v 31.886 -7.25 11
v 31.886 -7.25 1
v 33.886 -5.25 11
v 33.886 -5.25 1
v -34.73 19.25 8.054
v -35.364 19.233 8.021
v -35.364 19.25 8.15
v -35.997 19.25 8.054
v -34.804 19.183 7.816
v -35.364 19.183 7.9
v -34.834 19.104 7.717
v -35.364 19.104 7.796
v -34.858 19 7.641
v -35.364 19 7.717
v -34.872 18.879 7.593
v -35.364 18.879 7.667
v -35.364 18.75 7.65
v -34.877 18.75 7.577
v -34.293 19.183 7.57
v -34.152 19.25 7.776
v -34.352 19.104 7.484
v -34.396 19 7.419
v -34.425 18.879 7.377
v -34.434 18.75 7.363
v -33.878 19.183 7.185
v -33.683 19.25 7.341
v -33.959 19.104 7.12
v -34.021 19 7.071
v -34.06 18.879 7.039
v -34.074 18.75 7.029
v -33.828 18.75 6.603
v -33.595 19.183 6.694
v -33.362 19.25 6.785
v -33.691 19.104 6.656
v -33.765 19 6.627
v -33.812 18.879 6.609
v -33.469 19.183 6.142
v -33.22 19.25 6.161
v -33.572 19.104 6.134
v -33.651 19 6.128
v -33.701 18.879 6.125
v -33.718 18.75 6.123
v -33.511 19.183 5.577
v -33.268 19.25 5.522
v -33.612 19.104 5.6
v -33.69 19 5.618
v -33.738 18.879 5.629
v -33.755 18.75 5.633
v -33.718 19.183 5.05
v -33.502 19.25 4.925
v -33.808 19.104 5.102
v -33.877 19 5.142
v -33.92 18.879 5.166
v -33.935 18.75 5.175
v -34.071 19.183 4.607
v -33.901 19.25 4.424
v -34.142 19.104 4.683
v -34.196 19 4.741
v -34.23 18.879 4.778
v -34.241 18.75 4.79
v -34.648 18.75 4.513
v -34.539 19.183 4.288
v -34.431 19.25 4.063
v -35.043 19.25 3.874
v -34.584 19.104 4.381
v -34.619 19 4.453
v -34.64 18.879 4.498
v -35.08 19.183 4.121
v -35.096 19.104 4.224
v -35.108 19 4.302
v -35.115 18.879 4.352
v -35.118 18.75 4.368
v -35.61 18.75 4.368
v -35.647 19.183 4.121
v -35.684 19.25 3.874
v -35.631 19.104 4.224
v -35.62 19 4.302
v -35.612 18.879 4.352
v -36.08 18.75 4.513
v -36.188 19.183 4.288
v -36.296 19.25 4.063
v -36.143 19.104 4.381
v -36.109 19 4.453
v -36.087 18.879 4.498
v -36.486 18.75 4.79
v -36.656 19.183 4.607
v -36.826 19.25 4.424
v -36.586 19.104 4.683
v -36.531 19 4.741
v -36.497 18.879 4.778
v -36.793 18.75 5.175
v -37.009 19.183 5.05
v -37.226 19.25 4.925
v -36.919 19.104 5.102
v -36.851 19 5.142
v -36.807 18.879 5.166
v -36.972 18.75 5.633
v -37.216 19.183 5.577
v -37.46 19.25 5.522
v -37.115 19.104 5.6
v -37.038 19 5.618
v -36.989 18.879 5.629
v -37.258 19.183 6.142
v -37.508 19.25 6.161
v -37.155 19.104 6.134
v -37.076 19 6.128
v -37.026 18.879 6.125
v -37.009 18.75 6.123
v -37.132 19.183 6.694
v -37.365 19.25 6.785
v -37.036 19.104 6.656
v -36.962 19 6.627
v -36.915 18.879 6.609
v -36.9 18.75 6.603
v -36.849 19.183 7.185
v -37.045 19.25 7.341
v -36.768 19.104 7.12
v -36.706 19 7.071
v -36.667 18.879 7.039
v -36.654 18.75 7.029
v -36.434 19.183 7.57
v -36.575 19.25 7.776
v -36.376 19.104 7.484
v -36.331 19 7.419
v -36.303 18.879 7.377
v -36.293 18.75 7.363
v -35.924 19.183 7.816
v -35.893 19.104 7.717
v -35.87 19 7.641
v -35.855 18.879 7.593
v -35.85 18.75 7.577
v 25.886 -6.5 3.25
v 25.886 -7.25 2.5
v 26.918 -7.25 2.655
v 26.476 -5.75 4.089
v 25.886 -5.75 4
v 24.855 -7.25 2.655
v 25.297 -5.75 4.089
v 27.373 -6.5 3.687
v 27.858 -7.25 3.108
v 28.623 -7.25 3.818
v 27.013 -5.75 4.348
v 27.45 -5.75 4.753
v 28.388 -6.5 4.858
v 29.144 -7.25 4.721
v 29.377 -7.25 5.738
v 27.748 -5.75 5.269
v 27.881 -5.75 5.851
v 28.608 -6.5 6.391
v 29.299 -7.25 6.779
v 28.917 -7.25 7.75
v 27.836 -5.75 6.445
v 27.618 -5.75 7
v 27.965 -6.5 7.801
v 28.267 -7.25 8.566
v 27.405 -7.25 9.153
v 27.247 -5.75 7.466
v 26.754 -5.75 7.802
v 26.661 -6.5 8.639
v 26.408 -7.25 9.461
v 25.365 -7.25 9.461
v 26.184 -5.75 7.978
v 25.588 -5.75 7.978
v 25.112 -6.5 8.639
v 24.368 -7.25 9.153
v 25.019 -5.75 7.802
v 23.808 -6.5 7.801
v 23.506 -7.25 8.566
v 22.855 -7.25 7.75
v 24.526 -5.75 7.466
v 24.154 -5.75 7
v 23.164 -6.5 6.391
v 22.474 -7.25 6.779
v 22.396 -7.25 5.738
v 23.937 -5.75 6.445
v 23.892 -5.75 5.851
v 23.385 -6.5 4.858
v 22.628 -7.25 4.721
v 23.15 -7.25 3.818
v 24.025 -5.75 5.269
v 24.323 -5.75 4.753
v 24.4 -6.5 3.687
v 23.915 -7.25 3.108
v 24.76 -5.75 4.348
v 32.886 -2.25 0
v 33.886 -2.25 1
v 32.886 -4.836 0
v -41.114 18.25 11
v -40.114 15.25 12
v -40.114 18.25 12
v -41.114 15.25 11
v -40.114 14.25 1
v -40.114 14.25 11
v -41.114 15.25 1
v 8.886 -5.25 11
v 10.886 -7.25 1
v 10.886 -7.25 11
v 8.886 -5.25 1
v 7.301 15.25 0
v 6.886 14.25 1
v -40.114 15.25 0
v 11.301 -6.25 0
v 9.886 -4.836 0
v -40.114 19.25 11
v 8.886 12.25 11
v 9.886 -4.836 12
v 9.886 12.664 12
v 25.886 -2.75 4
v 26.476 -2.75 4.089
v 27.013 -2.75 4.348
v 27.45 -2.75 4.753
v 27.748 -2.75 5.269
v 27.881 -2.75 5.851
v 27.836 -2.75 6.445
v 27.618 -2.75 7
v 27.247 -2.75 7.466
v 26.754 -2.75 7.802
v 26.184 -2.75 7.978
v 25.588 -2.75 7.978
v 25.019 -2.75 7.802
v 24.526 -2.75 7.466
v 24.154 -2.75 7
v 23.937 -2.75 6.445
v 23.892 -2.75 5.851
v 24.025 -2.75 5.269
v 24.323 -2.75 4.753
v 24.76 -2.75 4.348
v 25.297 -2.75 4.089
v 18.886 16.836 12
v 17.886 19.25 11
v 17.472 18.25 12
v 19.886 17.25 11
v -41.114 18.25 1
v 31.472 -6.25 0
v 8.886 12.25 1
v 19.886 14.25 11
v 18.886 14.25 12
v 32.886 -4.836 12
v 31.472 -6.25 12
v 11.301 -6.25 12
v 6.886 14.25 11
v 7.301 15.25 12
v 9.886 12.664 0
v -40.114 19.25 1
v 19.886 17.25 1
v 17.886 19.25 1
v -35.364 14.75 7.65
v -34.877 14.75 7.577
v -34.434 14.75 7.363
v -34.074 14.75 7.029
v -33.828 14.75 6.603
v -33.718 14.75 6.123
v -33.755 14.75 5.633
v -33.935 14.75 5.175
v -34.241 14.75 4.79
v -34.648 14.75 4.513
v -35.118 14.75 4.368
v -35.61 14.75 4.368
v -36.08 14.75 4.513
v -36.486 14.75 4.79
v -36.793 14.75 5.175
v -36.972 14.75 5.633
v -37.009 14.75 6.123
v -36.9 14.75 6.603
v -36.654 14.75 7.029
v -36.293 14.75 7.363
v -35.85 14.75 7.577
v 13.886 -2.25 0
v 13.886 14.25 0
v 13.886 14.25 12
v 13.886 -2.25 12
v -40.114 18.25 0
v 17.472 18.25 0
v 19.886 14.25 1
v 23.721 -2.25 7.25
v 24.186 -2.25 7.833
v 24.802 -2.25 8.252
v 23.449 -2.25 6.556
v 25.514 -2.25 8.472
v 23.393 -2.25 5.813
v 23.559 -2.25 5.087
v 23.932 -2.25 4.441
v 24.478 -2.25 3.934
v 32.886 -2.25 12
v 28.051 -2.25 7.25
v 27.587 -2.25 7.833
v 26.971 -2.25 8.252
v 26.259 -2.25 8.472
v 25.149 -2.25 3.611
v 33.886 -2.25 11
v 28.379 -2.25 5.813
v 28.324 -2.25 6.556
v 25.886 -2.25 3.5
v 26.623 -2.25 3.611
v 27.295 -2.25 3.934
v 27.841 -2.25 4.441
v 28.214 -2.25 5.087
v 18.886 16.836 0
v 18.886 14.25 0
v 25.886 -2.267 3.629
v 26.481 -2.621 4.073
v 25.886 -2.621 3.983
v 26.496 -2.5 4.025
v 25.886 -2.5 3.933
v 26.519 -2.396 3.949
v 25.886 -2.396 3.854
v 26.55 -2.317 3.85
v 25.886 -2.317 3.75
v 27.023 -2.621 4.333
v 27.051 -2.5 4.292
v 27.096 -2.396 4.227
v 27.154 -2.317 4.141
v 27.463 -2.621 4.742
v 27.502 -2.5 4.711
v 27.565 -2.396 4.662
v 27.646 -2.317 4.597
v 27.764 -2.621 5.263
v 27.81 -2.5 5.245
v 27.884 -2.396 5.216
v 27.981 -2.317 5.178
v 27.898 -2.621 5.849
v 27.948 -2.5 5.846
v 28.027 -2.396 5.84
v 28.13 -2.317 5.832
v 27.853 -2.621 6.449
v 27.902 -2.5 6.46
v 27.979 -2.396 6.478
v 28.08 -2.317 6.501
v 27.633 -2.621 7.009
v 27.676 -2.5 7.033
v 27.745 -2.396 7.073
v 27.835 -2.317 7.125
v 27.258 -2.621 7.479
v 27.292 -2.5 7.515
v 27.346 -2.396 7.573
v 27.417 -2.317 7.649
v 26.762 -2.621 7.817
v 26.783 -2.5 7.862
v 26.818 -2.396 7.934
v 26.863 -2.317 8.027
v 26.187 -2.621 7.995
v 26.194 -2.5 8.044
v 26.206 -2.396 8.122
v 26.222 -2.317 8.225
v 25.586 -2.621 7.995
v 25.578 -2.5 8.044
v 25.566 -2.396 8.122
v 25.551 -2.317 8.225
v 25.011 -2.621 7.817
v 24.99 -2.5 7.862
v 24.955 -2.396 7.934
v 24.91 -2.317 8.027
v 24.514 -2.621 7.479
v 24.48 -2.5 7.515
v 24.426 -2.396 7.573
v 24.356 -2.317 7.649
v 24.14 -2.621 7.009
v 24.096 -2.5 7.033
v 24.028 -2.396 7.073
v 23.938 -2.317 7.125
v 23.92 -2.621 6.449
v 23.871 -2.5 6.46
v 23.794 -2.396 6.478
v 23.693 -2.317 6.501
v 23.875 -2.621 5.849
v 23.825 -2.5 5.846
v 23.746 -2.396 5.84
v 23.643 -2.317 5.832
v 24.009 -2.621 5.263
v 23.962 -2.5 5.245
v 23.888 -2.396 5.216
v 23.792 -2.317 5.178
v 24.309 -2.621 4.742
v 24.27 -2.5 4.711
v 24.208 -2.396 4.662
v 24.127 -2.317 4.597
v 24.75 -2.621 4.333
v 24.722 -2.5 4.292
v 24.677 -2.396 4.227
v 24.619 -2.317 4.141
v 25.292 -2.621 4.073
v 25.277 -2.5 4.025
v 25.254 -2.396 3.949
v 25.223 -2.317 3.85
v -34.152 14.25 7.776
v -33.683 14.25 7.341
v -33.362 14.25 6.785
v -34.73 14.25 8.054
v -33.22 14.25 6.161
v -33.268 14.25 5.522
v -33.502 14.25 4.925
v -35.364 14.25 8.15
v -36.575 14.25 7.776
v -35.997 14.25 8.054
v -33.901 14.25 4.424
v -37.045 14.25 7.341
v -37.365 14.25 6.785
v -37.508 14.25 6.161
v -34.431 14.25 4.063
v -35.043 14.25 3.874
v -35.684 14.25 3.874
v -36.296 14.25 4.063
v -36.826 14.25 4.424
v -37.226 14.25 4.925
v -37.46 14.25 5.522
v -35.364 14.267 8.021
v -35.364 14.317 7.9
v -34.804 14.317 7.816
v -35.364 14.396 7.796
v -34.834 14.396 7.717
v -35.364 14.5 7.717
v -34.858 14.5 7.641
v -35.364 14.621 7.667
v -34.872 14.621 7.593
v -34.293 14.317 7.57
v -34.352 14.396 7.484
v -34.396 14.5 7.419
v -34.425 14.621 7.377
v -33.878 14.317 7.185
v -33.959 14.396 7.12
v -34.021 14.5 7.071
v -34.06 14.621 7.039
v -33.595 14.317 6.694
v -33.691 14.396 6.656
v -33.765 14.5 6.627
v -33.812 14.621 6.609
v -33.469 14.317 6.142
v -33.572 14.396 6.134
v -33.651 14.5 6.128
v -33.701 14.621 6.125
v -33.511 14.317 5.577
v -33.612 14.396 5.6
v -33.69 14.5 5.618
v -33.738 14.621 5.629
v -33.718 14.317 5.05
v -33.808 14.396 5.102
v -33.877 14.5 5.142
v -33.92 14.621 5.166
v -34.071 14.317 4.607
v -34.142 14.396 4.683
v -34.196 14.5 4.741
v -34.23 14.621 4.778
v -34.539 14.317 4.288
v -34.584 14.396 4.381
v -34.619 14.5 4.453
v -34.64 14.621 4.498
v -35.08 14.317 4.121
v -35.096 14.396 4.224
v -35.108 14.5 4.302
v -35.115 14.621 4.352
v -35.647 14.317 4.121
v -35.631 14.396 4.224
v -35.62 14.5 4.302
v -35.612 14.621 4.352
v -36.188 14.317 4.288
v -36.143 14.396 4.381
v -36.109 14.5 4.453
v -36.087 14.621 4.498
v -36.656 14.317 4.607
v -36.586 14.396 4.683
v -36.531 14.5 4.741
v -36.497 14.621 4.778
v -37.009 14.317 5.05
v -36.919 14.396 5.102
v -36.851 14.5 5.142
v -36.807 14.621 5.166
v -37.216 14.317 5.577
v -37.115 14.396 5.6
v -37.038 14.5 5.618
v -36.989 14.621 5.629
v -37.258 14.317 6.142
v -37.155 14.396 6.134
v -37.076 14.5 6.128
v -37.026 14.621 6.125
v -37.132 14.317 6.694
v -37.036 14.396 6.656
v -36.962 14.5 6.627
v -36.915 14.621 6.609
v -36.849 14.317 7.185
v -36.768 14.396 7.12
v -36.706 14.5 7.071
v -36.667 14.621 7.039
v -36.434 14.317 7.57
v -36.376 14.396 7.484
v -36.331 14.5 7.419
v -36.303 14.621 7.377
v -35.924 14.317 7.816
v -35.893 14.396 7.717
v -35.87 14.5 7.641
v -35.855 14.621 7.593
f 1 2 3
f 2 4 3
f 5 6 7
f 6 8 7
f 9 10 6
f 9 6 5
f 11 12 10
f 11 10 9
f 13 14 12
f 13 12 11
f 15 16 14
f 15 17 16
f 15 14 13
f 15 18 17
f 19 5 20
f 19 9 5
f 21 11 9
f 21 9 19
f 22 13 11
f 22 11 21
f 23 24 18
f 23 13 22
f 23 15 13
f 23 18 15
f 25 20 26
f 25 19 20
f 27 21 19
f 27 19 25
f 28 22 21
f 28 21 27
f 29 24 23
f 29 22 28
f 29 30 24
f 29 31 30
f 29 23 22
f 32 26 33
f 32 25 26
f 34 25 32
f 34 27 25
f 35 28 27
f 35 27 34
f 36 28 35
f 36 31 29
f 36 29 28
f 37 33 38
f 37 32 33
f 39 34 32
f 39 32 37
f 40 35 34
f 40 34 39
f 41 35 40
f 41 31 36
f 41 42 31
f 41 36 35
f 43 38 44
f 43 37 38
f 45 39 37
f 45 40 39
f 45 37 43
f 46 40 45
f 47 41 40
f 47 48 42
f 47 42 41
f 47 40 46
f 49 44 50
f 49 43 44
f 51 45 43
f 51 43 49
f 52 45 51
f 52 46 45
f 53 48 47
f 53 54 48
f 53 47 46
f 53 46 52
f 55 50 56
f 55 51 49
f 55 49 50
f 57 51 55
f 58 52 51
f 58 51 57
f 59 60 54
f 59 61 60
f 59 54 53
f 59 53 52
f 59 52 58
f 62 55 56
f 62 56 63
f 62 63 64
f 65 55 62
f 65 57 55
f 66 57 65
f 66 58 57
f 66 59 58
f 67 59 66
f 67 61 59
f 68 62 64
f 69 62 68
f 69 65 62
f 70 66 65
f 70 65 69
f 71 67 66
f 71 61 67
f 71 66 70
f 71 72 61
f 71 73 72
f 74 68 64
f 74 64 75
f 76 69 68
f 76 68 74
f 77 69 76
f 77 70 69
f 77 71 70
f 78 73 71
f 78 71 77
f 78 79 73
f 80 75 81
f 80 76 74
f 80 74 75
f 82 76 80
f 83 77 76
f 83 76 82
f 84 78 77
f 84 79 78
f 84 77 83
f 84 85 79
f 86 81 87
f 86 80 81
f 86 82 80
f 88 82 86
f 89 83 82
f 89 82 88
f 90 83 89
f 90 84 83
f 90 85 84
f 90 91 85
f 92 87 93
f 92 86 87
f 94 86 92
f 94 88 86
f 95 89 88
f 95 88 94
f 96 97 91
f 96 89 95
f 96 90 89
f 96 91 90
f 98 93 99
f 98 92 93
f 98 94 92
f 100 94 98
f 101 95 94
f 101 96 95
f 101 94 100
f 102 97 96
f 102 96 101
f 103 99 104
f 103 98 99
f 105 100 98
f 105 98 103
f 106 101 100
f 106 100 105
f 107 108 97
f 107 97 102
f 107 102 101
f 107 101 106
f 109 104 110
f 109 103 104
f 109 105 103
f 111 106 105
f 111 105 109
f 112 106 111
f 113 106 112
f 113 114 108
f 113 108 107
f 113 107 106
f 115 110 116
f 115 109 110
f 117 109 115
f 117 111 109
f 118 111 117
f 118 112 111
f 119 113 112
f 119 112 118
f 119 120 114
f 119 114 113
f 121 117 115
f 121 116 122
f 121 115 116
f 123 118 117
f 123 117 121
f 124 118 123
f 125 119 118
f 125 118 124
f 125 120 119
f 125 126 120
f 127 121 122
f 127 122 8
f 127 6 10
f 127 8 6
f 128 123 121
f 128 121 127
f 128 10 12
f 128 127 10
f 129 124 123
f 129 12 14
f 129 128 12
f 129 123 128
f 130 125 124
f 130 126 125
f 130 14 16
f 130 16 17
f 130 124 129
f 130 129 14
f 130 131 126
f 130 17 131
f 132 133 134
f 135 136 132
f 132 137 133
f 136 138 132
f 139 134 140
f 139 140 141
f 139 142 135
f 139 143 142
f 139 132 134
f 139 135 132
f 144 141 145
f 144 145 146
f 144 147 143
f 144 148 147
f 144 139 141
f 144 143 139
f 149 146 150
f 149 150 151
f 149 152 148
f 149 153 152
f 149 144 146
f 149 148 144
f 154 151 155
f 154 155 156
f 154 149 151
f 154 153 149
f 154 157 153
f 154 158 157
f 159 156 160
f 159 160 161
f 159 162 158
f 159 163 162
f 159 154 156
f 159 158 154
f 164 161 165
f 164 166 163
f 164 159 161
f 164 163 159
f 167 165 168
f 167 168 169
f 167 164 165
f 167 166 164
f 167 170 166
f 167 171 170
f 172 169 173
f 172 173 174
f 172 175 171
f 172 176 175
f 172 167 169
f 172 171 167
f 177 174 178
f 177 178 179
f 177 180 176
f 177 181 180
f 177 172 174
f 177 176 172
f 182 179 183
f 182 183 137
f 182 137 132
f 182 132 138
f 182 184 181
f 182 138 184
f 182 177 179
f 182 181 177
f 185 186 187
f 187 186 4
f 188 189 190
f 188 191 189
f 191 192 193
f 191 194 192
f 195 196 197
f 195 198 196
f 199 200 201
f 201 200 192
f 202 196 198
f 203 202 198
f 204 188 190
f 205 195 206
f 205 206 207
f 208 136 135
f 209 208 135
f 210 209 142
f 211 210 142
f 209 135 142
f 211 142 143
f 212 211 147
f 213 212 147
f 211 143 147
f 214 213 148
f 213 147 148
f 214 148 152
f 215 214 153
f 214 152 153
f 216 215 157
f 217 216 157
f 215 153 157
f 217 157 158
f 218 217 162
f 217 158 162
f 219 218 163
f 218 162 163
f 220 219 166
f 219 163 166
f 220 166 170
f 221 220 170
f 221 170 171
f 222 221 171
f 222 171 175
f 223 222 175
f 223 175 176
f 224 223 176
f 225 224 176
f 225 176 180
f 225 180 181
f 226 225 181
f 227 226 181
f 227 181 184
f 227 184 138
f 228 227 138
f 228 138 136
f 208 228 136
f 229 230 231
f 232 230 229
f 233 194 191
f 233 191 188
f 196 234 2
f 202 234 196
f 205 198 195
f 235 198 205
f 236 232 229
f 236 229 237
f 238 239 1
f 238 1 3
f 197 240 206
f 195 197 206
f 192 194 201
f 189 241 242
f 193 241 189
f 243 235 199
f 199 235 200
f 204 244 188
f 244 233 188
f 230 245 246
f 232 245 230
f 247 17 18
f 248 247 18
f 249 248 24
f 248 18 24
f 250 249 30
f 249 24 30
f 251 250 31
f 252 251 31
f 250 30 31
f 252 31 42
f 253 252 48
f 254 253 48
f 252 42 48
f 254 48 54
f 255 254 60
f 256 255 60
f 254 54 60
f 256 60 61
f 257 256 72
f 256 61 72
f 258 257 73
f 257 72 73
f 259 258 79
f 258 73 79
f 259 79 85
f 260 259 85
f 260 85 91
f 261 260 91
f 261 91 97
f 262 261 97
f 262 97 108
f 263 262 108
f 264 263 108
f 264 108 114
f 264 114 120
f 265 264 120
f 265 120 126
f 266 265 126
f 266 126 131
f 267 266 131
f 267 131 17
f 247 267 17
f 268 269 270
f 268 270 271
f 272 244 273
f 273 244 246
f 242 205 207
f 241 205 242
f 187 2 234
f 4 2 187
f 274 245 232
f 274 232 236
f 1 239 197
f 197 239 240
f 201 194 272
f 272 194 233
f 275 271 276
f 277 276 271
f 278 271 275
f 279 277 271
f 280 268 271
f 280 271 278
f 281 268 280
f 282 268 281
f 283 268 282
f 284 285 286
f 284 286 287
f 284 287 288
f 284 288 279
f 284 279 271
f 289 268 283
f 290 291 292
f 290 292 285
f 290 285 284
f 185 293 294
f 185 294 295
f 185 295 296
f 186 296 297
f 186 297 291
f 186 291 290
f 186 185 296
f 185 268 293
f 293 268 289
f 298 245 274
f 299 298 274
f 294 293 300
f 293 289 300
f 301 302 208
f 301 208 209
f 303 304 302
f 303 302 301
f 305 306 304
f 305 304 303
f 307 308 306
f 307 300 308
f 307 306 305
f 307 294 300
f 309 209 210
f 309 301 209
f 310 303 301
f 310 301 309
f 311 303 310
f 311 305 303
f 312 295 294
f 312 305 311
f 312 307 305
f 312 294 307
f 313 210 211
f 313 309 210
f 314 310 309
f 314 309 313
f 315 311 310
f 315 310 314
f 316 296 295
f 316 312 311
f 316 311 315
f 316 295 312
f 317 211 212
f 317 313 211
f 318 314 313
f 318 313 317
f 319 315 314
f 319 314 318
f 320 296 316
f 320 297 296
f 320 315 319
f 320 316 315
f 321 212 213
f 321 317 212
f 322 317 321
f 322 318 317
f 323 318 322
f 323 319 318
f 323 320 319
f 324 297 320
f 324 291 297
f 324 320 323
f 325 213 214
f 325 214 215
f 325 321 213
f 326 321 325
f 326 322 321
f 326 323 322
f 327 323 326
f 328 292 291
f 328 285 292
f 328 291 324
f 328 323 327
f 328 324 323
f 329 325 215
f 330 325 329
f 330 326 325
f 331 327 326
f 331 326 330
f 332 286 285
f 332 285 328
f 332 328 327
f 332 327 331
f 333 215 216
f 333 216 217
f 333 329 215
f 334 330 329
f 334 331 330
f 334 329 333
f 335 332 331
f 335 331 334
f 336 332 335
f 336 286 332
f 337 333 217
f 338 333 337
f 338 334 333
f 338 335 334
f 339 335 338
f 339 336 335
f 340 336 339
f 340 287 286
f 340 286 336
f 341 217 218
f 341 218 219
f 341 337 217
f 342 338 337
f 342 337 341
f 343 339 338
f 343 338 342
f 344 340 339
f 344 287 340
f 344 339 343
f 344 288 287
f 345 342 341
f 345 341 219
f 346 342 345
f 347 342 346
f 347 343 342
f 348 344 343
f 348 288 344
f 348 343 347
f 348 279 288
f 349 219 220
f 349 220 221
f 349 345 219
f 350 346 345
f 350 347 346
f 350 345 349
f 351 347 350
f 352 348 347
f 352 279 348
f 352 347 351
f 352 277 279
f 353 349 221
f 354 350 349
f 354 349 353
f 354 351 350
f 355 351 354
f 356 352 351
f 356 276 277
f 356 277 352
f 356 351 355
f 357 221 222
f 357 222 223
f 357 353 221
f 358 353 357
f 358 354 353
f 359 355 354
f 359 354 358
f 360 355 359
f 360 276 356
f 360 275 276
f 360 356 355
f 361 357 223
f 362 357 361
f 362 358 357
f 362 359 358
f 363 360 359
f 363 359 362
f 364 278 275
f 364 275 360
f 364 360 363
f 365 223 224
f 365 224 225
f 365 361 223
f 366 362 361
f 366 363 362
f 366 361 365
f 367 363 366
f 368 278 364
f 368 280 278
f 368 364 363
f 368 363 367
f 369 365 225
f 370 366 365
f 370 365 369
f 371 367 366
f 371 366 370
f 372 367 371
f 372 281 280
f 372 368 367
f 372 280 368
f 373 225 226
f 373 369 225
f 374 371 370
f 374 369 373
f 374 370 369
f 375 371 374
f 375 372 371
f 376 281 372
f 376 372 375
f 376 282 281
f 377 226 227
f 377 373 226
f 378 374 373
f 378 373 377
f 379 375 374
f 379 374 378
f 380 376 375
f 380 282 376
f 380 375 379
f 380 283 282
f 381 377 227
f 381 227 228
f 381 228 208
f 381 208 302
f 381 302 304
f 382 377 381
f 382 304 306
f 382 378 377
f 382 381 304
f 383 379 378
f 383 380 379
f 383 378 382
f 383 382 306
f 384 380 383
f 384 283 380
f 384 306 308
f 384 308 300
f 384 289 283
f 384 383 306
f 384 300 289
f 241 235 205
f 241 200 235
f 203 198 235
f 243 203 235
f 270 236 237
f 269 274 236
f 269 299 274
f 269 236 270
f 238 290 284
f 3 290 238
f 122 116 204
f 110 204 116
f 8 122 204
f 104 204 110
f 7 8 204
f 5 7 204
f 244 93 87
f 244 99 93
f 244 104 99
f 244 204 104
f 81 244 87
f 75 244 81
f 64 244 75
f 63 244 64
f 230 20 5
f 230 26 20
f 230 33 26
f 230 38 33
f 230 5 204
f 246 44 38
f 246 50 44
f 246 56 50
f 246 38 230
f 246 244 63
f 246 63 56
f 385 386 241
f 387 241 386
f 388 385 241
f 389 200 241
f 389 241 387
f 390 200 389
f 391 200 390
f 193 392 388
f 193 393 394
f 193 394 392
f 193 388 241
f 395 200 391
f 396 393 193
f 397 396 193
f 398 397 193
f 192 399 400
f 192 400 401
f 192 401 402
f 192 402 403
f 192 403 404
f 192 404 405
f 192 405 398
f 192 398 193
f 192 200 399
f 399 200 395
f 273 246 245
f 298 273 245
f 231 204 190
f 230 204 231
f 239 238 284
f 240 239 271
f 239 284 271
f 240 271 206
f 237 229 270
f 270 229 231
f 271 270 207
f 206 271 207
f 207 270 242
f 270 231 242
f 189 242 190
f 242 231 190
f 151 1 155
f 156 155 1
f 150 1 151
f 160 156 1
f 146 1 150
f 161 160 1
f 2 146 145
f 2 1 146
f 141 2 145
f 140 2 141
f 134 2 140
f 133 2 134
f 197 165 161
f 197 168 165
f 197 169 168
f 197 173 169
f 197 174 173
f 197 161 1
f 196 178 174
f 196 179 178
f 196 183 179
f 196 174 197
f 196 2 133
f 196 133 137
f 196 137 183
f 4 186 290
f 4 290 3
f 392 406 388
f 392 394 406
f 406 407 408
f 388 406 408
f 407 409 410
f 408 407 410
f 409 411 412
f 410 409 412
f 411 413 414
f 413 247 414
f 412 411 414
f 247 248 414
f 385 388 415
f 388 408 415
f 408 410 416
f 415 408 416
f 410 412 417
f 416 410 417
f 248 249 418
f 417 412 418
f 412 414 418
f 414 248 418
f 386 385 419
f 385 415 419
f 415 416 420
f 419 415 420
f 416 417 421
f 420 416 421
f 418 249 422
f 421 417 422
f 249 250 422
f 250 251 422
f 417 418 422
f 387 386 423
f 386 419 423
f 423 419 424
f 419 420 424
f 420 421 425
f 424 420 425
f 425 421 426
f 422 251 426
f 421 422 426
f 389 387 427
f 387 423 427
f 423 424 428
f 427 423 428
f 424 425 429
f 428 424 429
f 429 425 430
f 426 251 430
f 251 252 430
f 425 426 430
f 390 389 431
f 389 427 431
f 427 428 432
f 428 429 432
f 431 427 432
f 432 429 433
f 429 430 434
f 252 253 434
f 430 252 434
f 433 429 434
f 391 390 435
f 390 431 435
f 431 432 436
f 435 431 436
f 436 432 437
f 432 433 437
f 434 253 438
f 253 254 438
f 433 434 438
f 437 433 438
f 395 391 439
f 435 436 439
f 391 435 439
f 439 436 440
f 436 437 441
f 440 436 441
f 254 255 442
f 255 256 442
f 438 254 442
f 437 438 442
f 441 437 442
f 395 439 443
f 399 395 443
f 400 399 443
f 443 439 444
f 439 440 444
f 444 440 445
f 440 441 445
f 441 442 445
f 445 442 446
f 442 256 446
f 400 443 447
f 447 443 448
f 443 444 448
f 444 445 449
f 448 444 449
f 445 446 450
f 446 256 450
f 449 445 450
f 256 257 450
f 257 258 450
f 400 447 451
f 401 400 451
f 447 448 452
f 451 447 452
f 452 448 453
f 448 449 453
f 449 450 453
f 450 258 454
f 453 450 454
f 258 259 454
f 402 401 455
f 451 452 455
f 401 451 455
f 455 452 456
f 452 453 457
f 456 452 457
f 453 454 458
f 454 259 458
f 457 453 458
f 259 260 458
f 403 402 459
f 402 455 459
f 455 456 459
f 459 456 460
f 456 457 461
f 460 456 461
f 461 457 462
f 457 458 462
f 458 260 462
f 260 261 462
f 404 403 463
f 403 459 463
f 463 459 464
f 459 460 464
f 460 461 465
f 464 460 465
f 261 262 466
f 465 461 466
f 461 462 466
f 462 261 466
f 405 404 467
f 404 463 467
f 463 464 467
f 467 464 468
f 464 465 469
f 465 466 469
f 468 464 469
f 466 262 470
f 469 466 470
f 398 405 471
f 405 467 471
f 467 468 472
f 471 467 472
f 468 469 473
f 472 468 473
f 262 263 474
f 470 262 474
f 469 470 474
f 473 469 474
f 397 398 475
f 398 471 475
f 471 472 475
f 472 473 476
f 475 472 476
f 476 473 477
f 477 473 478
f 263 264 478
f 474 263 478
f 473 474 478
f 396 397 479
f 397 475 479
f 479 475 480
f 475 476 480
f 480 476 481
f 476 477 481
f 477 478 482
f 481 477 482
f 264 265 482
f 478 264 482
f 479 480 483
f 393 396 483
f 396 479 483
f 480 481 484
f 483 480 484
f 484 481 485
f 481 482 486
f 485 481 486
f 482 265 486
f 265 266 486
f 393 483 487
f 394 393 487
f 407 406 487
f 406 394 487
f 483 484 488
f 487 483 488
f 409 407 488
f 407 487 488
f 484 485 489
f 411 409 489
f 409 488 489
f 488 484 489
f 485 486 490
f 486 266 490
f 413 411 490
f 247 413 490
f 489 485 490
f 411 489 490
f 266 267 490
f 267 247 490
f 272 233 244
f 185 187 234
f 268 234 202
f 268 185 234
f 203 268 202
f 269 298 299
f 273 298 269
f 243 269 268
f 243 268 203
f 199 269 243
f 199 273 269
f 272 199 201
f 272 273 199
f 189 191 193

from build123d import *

# Parameters (mm, degrees)
RESSALTO_EXTRUS_O1_DEPTH = 12
ESBO_O3_R                = 2
CORTE_EXTRUS_O1_DEPTH    = 15
CHANFRO1_SIZE            = 1.5
FILETE1_R                = 0.5
CHANFRO5_SIZE            = 2
CHANFRO8_SIZE            = 1
ESBO_O4_R                = 1.65
CORTE_EXTRUS_O2_DEPTH    = 10
FILETE2_R                = 0.5


with BuildPart() as part:
    # Esboço1 → Ressalto-extrusão1 (new body)
    with BuildSketch(Plane.XY):
        Polygon((19.886382163, 14.25), (13.886382163, 14.25), (13.886382163, -2.25), (33.886382163, -2.25), (33.886382163, -7.25), (8.886382163, -7.25), (8.886382163, 14.25), (-41.113617837, 14.25), (-41.113617837, 19.25), (19.886382163, 19.25), align=None)
    extrude(amount=RESSALTO_EXTRUS_O1_DEPTH)

    # Esboço3 → Corte-extrusão1 (cut)
    with BuildSketch(Plane.XZ.offset(7.25)):
        with Locations(Location((25.886382163, 6, 0), (0, 0, 270))):
            Circle(ESBO_O3_R)
    extrude(amount=-CORTE_EXTRUS_O1_DEPTH, mode=Mode.SUBTRACT)

    # Chanfro1
    chanfro1_edges = [part.edges().sort_by_distance(p)[0] for p in [
        (25.886382163, -7.25, 8),
    ]]
    chamfer(chanfro1_edges, length=CHANFRO1_SIZE)

    # Filete1
    filete1_edges = [part.edges().sort_by_distance(p)[0] for p in [
        (25.886382163, -2.25, 8),
    ]]
    fillet(filete1_edges, radius=FILETE1_R)

    # Chanfro5
    chanfro5_edges = [part.edges().sort_by_distance(p)[0] for p in [
        (33.886382163, -7.25, 6),
        (8.886382163, -7.25, 6),
        (8.886382163, 14.25, 6),
        (19.886382163, 19.25, 6),
    ]]
    chamfer(chanfro5_edges, length=CHANFRO5_SIZE)

    # Chanfro8
    chanfro8_edges = [part.edges().sort_by_distance(p)[0] for p in [
        (-41.113617837, 19.25, 6),
        (-41.113617837, 16.75, 12),
        (-41.113617837, 14.25, 6),
        (-41.113617837, 16.75, 0),
        (19.886382163, 15.75, 0),
        (-11.613617837, 19.25, 0),
        (33.886382163, -3.75, 0),
        (32.886382163, -6.25, 0),
        (21.386382163, -7.25, 0),
        (9.886382163, -6.25, 0),
        (8.886382163, 3.5, 0),
        (7.886382163, 13.25, 0),
        (-17.113617837, 14.25, 0),
        (33.886382163, -3.75, 12),
        (32.886382163, -6.25, 12),
        (21.386382163, -7.25, 12),
        (9.886382163, -6.25, 12),
        (8.886382163, 3.5, 12),
        (7.886382163, 13.25, 12),
        (-17.113617837, 14.25, 12),
        (19.886382163, 15.75, 12),
        (-11.613617837, 19.25, 12),
        (18.886382163, 18.25, 0),
        (18.886382163, 18.25, 12),
    ]]
    chamfer(chanfro8_edges, length=CHANFRO8_SIZE)

    # Esboço4 → Corte-extrusão2 (cut)
    with BuildSketch(Plane(origin=(0, 19.25, 0), x_dir=(1, 0, 0), z_dir=(0, 1, 0))):
        with Locations(Location((-35.363617837, -6, 0), (0, 0, 270))):
            Circle(ESBO_O4_R)
    extrude(amount=-CORTE_EXTRUS_O2_DEPTH, mode=Mode.SUBTRACT)

    # Filete2
    filete2_edges = [part.edges().sort_by_distance(p)[0] for p in [
        (-35.363617837, 14.25, 4.35),
        (-35.363617837, 19.25, 4.35),
    ]]
    fillet(filete2_edges, radius=FILETE2_R)


solid = part.part
